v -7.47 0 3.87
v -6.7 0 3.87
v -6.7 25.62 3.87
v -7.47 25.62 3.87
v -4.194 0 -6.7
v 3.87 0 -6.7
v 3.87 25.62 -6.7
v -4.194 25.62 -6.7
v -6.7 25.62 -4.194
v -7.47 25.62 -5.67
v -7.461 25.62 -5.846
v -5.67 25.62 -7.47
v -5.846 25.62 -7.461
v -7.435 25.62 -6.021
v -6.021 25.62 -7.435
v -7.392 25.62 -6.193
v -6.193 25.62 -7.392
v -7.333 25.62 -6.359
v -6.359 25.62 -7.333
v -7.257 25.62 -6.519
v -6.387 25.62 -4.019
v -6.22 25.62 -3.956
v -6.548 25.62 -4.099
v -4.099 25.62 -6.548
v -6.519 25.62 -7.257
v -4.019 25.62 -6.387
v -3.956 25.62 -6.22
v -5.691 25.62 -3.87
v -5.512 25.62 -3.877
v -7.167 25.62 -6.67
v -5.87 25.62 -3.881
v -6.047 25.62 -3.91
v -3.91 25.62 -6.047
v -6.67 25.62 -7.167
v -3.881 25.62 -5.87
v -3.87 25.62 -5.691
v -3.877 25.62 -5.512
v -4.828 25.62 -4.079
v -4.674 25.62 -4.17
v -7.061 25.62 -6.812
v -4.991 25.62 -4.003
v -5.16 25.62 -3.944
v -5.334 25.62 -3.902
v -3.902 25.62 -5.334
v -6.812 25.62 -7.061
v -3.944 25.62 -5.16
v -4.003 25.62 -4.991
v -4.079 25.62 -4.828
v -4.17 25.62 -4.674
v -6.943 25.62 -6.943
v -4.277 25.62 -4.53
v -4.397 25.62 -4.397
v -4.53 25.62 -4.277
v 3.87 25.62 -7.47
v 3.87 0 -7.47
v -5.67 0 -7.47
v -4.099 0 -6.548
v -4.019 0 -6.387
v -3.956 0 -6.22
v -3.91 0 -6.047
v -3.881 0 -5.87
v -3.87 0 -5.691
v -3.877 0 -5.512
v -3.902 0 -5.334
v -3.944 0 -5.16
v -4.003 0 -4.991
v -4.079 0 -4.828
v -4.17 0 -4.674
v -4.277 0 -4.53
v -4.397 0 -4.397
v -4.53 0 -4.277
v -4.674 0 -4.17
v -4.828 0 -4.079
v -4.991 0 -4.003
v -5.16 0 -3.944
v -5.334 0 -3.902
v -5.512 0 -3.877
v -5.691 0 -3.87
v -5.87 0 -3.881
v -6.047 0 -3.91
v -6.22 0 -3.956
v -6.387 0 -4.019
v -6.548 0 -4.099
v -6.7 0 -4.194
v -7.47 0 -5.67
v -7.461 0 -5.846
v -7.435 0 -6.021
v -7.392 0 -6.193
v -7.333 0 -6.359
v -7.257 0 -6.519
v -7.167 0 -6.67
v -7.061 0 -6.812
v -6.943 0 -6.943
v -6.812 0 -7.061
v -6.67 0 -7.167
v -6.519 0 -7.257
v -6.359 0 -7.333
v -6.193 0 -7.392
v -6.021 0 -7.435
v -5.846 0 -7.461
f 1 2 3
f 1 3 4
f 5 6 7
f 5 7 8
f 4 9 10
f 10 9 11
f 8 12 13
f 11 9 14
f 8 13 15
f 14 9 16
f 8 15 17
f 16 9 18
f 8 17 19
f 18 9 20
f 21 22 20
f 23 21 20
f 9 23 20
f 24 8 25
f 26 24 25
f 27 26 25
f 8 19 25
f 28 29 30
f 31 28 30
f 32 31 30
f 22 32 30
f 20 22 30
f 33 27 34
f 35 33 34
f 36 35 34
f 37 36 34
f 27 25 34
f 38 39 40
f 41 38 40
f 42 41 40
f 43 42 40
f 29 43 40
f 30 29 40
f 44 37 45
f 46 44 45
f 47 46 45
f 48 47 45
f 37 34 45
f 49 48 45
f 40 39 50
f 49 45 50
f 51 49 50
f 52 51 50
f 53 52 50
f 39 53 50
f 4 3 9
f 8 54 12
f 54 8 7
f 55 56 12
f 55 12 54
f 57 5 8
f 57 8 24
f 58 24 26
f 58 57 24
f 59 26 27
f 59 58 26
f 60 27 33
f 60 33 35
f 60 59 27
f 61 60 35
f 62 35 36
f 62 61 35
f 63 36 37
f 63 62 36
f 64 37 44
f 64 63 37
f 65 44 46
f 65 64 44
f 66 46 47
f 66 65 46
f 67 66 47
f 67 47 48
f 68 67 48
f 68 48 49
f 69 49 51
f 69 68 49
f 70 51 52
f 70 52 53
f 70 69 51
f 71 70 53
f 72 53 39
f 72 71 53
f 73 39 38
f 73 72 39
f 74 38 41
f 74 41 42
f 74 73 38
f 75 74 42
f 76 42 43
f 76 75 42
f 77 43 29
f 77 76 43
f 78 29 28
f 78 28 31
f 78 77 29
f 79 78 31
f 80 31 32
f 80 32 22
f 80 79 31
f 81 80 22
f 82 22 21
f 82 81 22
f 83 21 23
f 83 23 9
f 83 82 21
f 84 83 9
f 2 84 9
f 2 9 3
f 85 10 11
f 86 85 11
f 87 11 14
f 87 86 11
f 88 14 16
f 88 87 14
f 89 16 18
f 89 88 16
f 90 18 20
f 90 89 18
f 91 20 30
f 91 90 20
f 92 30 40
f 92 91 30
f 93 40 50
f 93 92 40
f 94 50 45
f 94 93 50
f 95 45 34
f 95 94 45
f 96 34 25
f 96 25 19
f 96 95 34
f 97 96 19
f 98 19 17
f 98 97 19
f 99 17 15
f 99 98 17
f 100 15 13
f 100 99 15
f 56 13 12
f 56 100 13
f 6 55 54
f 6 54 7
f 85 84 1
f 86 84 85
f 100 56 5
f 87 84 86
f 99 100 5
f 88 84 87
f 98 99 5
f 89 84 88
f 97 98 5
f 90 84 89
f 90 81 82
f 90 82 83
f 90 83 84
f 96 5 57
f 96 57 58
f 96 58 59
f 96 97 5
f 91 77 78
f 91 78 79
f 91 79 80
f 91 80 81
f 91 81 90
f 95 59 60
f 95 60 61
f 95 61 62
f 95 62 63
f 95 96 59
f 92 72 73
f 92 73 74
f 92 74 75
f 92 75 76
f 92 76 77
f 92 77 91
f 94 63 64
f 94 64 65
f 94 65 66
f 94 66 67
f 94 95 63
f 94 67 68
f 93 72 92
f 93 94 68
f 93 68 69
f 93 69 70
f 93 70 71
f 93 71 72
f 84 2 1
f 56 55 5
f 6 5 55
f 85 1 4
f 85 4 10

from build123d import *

# Parameters (mm, degrees)
BOSS_EXTRUDE2_DEPTH = 25.62


with BuildPart() as part:
    # Sketch3 → Boss-Extrude2 (new body)
    with BuildSketch(Plane(origin=(0, 0, 0), x_dir=(1, 0, 0), z_dir=(0, 1, 0))):
        with BuildLine():
            ThreePointArc((-4.193822504, 6.7), (-4.397207794, 4.397207794), (-6.7, 4.193822504))
            Line((-6.7, 4.193822504), (-6.7, 3.87))
            Line((-6.7, 3.87), (-6.7, -3.87))
            Line((-6.7, -3.87), (-7.47, -3.87))
            Line((-7.47, -3.87), (-7.47, 3.87))
            Line((-7.47, 3.87), (-7.47, 5.67))
            ThreePointArc((-7.47, 5.67), (-6.942792206, 6.942792206), (-5.67, 7.47))
            Line((-5.67, 7.47), (-3.87, 7.47))
            Line((-3.87, 7.47), (3.87, 7.47))
            Line((3.87, 7.47), (3.87, 6.7))
            Line((3.87, 6.7), (-3.87, 6.7))
            Line((-3.87, 6.7), (-4.193822504, 6.7))
        make_face()
    extrude(amount=BOSS_EXTRUDE2_DEPTH)


solid = part.part
